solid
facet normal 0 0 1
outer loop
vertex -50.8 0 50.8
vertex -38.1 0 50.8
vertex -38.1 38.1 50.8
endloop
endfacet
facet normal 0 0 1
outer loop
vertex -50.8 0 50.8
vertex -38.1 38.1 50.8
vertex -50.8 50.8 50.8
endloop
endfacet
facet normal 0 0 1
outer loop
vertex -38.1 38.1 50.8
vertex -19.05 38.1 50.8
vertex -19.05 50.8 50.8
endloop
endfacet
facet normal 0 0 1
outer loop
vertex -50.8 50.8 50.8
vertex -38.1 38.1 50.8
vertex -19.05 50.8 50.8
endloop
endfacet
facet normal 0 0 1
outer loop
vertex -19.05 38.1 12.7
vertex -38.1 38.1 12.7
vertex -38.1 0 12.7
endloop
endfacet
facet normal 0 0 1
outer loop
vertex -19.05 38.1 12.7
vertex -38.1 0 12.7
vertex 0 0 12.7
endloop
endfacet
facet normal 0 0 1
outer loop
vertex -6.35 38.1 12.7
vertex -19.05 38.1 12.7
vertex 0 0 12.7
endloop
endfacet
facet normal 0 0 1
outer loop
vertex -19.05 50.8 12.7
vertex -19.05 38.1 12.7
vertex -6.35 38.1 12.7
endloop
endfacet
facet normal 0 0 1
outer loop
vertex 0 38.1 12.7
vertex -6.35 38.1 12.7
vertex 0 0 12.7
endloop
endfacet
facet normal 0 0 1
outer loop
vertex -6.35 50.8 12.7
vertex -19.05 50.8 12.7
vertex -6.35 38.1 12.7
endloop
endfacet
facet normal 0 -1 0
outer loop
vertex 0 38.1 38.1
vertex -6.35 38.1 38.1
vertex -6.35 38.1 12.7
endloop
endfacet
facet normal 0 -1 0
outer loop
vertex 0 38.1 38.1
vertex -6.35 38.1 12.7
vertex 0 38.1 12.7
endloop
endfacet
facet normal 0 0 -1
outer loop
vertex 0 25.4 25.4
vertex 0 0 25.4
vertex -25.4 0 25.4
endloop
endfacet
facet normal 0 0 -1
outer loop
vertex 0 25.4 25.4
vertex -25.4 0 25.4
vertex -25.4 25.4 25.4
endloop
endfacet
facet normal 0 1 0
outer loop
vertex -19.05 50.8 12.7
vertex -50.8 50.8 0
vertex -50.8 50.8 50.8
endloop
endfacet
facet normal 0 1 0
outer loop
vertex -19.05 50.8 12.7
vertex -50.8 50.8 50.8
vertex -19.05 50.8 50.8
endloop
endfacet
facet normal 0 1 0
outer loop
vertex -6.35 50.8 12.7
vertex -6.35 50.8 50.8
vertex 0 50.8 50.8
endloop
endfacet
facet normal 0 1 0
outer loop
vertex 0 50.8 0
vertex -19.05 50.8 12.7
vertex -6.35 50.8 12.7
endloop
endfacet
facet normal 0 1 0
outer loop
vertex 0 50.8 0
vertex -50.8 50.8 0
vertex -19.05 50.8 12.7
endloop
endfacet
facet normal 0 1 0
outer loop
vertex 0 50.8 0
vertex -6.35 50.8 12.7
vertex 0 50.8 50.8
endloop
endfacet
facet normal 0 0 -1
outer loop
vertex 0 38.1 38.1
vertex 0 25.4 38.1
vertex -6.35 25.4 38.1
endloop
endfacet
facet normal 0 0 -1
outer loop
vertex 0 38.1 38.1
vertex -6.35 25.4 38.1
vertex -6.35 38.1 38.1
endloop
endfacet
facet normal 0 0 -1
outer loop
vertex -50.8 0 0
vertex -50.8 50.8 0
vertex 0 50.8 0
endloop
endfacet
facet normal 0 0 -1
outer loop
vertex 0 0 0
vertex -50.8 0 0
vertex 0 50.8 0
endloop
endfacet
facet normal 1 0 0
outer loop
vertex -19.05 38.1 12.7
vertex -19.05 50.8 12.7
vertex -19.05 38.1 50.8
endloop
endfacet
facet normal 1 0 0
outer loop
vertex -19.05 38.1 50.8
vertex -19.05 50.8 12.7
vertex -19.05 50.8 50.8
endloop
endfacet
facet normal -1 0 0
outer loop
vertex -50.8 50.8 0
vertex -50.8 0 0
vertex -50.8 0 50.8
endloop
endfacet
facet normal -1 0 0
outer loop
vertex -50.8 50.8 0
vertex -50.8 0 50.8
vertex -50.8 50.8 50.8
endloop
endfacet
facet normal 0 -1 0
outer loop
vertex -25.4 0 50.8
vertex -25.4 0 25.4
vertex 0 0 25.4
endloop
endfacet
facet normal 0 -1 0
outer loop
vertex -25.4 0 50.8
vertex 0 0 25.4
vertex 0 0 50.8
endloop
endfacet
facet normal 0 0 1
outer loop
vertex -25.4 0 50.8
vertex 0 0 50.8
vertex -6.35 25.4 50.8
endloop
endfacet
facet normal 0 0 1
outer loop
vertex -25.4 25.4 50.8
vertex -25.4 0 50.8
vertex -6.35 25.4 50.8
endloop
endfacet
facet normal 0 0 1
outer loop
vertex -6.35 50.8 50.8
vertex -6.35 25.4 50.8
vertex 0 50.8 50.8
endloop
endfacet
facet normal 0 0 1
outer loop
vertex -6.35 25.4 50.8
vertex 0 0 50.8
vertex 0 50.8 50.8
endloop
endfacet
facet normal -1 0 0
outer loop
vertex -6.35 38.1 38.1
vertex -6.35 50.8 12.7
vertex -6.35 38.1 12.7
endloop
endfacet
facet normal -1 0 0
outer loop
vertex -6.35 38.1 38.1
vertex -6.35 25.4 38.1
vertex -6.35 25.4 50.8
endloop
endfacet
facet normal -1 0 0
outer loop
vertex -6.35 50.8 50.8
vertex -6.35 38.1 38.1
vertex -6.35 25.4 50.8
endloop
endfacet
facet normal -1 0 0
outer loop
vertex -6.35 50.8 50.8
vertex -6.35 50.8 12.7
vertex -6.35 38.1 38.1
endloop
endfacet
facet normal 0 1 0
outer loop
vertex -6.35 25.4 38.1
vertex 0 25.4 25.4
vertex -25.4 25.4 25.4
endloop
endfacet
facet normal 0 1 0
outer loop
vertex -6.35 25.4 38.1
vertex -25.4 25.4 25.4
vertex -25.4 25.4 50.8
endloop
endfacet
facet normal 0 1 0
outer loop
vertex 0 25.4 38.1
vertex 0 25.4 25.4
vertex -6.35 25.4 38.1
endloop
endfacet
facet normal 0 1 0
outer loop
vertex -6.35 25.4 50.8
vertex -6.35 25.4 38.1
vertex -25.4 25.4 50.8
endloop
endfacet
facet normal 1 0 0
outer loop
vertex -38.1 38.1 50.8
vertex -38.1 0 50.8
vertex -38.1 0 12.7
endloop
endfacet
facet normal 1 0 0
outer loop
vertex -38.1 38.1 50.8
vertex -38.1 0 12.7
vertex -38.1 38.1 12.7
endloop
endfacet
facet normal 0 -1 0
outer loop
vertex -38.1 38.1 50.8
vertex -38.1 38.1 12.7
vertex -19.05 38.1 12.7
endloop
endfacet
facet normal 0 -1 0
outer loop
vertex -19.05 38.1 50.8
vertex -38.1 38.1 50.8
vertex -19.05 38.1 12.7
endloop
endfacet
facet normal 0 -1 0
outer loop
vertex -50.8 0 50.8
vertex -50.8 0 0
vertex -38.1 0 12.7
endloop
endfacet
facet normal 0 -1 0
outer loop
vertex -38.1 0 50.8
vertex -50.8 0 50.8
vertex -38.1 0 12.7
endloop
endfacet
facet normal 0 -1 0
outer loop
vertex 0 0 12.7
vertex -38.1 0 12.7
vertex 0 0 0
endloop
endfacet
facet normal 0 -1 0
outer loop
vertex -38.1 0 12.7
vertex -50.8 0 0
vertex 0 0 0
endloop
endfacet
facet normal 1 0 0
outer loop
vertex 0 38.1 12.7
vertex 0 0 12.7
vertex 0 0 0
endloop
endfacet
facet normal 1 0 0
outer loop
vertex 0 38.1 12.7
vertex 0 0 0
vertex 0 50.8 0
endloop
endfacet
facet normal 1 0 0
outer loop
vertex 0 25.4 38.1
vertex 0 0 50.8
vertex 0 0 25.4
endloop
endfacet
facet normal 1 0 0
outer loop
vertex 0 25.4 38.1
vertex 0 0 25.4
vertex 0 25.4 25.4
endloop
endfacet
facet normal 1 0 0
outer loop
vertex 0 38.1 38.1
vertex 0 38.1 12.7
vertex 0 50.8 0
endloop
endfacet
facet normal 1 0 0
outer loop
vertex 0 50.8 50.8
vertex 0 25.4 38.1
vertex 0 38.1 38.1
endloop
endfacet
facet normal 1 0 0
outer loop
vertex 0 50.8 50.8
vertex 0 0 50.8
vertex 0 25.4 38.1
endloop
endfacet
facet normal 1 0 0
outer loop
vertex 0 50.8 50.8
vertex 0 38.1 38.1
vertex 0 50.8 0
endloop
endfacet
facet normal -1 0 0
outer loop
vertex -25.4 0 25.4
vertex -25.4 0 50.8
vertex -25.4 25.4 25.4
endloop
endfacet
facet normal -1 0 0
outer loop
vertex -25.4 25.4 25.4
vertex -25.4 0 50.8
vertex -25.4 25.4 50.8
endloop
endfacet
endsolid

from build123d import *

# Parameters (mm, degrees)
F0_W     = 50.8
F0_H     = 50.8
F1_DEPTH = 50.8
F2_W     = 38.1
F2_H     = 38.1
F3_DEPTH = 38.1
F4_W     = 50.8
F4_H     = 12.7
F5_DEPTH = 6.35
F6_W     = 25.4
F6_H     = 25.4
F7_DEPTH = 25.4
F8_W     = 6.35
F8_H     = 38.1
F9_DEPTH = 12.7


with BuildPart() as f1:
    # F0 (on Top) → F1 (new body)
    with BuildSketch(Plane.XY):
        with Locations((-25.4, 25.4)):
            Rectangle(F0_W, F0_H)
    extrude(amount=F1_DEPTH)

    # F2 (on face) → F3 (cut)
    with BuildSketch(Plane.XY.offset(50.8)):
        with Locations((-19.05, 19.05)):
            Rectangle(F2_W, F2_H)
    extrude(amount=-F3_DEPTH, mode=Mode.SUBTRACT)

    # F4 (on face) → F5 (join)
    with BuildSketch(Plane.YZ):
        with Locations((25.4, 44.45)):
            Rectangle(F4_W, F4_H)
    extrude(amount=-F5_DEPTH)

    # F6 (on face) → F7 (join)
    with BuildSketch(Plane.YZ):
        with Locations((12.7, 38.1)):
            Rectangle(F6_W, F6_H)
    extrude(amount=-F7_DEPTH)

    # F8 (on face) → F9 (cut)
    with BuildSketch(Plane(origin=(0, 50.8, 0), x_dir=(-1, 0, 0), z_dir=(0, 1, 0))):
        with Locations((9.525, 31.75)):
            Rectangle(F8_W, F8_H)
        with Locations((15.875, 31.75)):
            Rectangle(F8_W, F8_H)
    extrude(amount=-F9_DEPTH, mode=Mode.SUBTRACT)


solid = f1.part
